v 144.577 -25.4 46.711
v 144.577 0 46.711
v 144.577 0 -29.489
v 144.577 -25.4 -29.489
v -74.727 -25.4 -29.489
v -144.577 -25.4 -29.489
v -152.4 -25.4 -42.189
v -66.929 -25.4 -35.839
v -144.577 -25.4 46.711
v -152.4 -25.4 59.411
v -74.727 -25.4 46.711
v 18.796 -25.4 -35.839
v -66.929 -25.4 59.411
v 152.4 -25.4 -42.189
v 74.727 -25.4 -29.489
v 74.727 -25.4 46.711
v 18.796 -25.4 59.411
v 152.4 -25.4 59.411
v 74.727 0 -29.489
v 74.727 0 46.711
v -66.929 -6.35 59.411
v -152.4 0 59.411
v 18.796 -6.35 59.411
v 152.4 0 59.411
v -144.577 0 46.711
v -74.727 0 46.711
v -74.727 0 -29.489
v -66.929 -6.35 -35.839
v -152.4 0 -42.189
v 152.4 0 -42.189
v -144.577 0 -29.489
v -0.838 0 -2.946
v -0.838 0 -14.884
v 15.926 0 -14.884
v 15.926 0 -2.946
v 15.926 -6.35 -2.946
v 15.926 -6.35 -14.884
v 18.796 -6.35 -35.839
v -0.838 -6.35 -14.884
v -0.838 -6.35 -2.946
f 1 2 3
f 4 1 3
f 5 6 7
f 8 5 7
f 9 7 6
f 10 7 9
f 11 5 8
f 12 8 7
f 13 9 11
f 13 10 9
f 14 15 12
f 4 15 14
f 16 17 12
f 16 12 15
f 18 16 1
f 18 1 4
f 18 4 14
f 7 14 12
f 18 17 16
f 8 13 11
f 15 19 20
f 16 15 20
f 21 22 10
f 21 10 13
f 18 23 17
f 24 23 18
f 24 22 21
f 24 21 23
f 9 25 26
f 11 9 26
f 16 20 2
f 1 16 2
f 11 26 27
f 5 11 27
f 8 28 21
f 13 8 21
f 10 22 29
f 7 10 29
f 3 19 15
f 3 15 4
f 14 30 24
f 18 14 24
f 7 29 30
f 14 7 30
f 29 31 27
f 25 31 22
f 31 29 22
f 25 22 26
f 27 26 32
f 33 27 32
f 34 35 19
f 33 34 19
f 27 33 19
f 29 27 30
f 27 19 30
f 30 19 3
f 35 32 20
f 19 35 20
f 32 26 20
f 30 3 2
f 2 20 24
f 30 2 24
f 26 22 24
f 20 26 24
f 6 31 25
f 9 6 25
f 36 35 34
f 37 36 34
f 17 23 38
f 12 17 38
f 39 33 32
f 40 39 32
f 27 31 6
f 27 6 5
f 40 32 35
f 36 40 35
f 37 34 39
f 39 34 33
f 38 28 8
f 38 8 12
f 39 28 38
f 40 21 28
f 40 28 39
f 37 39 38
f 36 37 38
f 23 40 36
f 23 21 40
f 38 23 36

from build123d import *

# Parameters (mm, degrees)
F0_W     = 7.8232
F0_H     = 6.35
F0_W_2   = 69.85
F0_W_3   = 55.9308
F0_H_2   = 76.2
F0_W_4   = 7.7978
F0_H_3   = 12.7
F0_W_5   = 85.725
F1_DEPTH = 25.4
F0_W_6   = 16.764
F0_H_4   = 0.762
F0_H_5   = 13.4315382606
F0_W_7   = 66.0908
F0_W_8   = 2.8702
F0_H_6   = 4.9097025247
F0_H_7   = 5.1918955931
F2_DEPTH = 6.35


with BuildPart() as f1:
    # F0 (on Front) → F1 (new body)
    with BuildSketch(Plane.XZ):
        with Locations((148.4884, 56.2362195122)):
            Rectangle(F0_W, F0_H)
        with Locations((109.6518, 56.2362195122)):
            Rectangle(F0_W_2, F0_H)
        with Locations((148.4884, 49.8862195122)):
            Rectangle(F0_W, F0_H)
        with Locations((46.7614, 56.2362195122)):
            Rectangle(F0_W_3, F0_H)
        with Locations((109.6518, 49.8862195122)):
            Rectangle(F0_W_2, F0_H)
        with Locations((148.4884, 8.6112195122)):
            Rectangle(F0_W, F0_H_2)
        with Locations((46.7614, 49.8862195122)):
            Rectangle(F0_W_3, F0_H)
        with Locations((148.4884, -32.6637804878)):
            Rectangle(F0_W, F0_H)
        with Locations((-70.8279, 56.2362195122)):
            Rectangle(F0_W_4, F0_H)
        Polygon((74.7268, -2.1837804878), (74.7268, 46.7112195122), (18.796, 46.7112195122), (18.796, 3.0081151053), (18.796, -2.1837804878), align=None)
        with Locations((109.6518, -32.6637804878)):
            Rectangle(F0_W_2, F0_H)
        with Locations((148.4884, -39.0137804878)):
            Rectangle(F0_W, F0_H)
        with Locations((-109.6518, 56.2362195122)):
            Rectangle(F0_W_2, F0_H)
        with Locations((-70.8279, 49.8862195122)):
            Rectangle(F0_W_4, F0_H)
        with Locations((46.7614, -8.5337804878)):
            Rectangle(F0_W_3, F0_H_3)
        with Locations((109.6518, -39.0137804878)):
            Rectangle(F0_W_2, F0_H)
        Polygon((18.796, -29.4887804878), (74.7268, -29.4887804878), (74.7268, -14.8837804878), (18.796, -14.8837804878), (18.796, -28.3153187484), align=None)
        with Locations((46.7614, -32.6637804878)):
            Rectangle(F0_W_3, F0_H)
        with Locations((-148.4884, 56.2362195122)):
            Rectangle(F0_W, F0_H)
        with Locations((-109.6518, 49.8862195122)):
            Rectangle(F0_W_2, F0_H)
        Polygon((-66.929, 2.7259220369), (-66.929, 46.7112195122), (-74.7268, 46.7112195122), (-74.7268, -2.1837804878), (-66.929, -2.1837804878), align=None)
        with Locations((46.7614, -39.0137804878)):
            Rectangle(F0_W_3, F0_H)
        with Locations((-148.4884, 49.8862195122)):
            Rectangle(F0_W, F0_H)
        with Locations((-24.0665, -39.0137804878)):
            Rectangle(F0_W_5, F0_H)
        Polygon((-74.7268, -29.4887804878), (-66.929, -29.4887804878), (-66.929, -28.3153187484), (-66.929, -14.8837804878), (-74.7268, -14.8837804878), align=None)
        with Locations((-70.8279, -32.6637804878)):
            Rectangle(F0_W_4, F0_H)
        with Locations((-148.4884, 8.6112195122)):
            Rectangle(F0_W, F0_H_2)
        with Locations((-70.8279, -8.5337804878)):
            Rectangle(F0_W_4, F0_H_3)
        with Locations((-70.8279, -39.0137804878)):
            Rectangle(F0_W_4, F0_H)
        with Locations((-109.6518, -32.6637804878)):
            Rectangle(F0_W_2, F0_H)
        with Locations((-148.4884, -32.6637804878)):
            Rectangle(F0_W, F0_H)
        with Locations((-109.6518, -39.0137804878)):
            Rectangle(F0_W_2, F0_H)
        with Locations((-148.4884, -39.0137804878)):
            Rectangle(F0_W, F0_H)
    extrude(amount=F1_DEPTH)

    # F0 (on Front) → F2 (join)
    with BuildSketch(Plane.XZ):
        with Locations((7.5438, -2.5647804878)):
            Rectangle(F0_W_6, F0_H_4)
        with Locations((7.5438, -21.5995496181)):
            Rectangle(F0_W_6, F0_H_5)
        Polygon((-66.929, -29.4887804878), (18.796, -29.4887804878), (18.796, -28.3153187484), (15.9258, -28.3153187484), (-0.8382, -28.3153187484), (-66.929, -28.3153187484), align=None)
        with Locations((-24.0665, -32.6637804878)):
            Rectangle(F0_W_5, F0_H)
        with Locations((-33.8836, -21.5995496181)):
            Rectangle(F0_W_7, F0_H_5)
        with Locations((17.3609, -21.5995496181)):
            Rectangle(F0_W_8, F0_H_5)
        Polygon((18.796, -14.8837804878), (18.796, -2.1837804878), (15.9258, -2.1837804878), (15.9258, -2.9457804878), (15.9258, -14.8837804878), align=None)
        Polygon((-0.8382, -2.1837804878), (-66.929, -2.1837804878), (-66.929, -14.8837804878), (-0.8382, -14.8837804878), (-0.8382, -2.9457804878), align=None)
        with Locations((-33.8836, 0.2710707746)):
            Rectangle(F0_W_7, F0_H_6)
        Polygon((15.9258, -2.1837804878), (15.9258, 3.0081151053), (-0.8382, 3.0081151053), (-0.8382, 2.7259220369), (-0.8382, -2.1837804878), align=None)
        with Locations((17.3609, 0.4121673088)):
            Rectangle(F0_W_8, F0_H_7)
        Polygon((18.796, 3.0081151053), (18.796, 46.7112195122), (-66.929, 46.7112195122), (-66.929, 2.7259220369), (-0.8382, 2.7259220369), (-0.8382, 3.0081151053), (15.9258, 3.0081151053), align=None)
        with Locations((-24.0665, 49.8862195122)):
            Rectangle(F0_W_5, F0_H)
        with Locations((-24.0665, 56.2362195122)):
            Rectangle(F0_W_5, F0_H)
    extrude(amount=F2_DEPTH)


solid = f1.part
